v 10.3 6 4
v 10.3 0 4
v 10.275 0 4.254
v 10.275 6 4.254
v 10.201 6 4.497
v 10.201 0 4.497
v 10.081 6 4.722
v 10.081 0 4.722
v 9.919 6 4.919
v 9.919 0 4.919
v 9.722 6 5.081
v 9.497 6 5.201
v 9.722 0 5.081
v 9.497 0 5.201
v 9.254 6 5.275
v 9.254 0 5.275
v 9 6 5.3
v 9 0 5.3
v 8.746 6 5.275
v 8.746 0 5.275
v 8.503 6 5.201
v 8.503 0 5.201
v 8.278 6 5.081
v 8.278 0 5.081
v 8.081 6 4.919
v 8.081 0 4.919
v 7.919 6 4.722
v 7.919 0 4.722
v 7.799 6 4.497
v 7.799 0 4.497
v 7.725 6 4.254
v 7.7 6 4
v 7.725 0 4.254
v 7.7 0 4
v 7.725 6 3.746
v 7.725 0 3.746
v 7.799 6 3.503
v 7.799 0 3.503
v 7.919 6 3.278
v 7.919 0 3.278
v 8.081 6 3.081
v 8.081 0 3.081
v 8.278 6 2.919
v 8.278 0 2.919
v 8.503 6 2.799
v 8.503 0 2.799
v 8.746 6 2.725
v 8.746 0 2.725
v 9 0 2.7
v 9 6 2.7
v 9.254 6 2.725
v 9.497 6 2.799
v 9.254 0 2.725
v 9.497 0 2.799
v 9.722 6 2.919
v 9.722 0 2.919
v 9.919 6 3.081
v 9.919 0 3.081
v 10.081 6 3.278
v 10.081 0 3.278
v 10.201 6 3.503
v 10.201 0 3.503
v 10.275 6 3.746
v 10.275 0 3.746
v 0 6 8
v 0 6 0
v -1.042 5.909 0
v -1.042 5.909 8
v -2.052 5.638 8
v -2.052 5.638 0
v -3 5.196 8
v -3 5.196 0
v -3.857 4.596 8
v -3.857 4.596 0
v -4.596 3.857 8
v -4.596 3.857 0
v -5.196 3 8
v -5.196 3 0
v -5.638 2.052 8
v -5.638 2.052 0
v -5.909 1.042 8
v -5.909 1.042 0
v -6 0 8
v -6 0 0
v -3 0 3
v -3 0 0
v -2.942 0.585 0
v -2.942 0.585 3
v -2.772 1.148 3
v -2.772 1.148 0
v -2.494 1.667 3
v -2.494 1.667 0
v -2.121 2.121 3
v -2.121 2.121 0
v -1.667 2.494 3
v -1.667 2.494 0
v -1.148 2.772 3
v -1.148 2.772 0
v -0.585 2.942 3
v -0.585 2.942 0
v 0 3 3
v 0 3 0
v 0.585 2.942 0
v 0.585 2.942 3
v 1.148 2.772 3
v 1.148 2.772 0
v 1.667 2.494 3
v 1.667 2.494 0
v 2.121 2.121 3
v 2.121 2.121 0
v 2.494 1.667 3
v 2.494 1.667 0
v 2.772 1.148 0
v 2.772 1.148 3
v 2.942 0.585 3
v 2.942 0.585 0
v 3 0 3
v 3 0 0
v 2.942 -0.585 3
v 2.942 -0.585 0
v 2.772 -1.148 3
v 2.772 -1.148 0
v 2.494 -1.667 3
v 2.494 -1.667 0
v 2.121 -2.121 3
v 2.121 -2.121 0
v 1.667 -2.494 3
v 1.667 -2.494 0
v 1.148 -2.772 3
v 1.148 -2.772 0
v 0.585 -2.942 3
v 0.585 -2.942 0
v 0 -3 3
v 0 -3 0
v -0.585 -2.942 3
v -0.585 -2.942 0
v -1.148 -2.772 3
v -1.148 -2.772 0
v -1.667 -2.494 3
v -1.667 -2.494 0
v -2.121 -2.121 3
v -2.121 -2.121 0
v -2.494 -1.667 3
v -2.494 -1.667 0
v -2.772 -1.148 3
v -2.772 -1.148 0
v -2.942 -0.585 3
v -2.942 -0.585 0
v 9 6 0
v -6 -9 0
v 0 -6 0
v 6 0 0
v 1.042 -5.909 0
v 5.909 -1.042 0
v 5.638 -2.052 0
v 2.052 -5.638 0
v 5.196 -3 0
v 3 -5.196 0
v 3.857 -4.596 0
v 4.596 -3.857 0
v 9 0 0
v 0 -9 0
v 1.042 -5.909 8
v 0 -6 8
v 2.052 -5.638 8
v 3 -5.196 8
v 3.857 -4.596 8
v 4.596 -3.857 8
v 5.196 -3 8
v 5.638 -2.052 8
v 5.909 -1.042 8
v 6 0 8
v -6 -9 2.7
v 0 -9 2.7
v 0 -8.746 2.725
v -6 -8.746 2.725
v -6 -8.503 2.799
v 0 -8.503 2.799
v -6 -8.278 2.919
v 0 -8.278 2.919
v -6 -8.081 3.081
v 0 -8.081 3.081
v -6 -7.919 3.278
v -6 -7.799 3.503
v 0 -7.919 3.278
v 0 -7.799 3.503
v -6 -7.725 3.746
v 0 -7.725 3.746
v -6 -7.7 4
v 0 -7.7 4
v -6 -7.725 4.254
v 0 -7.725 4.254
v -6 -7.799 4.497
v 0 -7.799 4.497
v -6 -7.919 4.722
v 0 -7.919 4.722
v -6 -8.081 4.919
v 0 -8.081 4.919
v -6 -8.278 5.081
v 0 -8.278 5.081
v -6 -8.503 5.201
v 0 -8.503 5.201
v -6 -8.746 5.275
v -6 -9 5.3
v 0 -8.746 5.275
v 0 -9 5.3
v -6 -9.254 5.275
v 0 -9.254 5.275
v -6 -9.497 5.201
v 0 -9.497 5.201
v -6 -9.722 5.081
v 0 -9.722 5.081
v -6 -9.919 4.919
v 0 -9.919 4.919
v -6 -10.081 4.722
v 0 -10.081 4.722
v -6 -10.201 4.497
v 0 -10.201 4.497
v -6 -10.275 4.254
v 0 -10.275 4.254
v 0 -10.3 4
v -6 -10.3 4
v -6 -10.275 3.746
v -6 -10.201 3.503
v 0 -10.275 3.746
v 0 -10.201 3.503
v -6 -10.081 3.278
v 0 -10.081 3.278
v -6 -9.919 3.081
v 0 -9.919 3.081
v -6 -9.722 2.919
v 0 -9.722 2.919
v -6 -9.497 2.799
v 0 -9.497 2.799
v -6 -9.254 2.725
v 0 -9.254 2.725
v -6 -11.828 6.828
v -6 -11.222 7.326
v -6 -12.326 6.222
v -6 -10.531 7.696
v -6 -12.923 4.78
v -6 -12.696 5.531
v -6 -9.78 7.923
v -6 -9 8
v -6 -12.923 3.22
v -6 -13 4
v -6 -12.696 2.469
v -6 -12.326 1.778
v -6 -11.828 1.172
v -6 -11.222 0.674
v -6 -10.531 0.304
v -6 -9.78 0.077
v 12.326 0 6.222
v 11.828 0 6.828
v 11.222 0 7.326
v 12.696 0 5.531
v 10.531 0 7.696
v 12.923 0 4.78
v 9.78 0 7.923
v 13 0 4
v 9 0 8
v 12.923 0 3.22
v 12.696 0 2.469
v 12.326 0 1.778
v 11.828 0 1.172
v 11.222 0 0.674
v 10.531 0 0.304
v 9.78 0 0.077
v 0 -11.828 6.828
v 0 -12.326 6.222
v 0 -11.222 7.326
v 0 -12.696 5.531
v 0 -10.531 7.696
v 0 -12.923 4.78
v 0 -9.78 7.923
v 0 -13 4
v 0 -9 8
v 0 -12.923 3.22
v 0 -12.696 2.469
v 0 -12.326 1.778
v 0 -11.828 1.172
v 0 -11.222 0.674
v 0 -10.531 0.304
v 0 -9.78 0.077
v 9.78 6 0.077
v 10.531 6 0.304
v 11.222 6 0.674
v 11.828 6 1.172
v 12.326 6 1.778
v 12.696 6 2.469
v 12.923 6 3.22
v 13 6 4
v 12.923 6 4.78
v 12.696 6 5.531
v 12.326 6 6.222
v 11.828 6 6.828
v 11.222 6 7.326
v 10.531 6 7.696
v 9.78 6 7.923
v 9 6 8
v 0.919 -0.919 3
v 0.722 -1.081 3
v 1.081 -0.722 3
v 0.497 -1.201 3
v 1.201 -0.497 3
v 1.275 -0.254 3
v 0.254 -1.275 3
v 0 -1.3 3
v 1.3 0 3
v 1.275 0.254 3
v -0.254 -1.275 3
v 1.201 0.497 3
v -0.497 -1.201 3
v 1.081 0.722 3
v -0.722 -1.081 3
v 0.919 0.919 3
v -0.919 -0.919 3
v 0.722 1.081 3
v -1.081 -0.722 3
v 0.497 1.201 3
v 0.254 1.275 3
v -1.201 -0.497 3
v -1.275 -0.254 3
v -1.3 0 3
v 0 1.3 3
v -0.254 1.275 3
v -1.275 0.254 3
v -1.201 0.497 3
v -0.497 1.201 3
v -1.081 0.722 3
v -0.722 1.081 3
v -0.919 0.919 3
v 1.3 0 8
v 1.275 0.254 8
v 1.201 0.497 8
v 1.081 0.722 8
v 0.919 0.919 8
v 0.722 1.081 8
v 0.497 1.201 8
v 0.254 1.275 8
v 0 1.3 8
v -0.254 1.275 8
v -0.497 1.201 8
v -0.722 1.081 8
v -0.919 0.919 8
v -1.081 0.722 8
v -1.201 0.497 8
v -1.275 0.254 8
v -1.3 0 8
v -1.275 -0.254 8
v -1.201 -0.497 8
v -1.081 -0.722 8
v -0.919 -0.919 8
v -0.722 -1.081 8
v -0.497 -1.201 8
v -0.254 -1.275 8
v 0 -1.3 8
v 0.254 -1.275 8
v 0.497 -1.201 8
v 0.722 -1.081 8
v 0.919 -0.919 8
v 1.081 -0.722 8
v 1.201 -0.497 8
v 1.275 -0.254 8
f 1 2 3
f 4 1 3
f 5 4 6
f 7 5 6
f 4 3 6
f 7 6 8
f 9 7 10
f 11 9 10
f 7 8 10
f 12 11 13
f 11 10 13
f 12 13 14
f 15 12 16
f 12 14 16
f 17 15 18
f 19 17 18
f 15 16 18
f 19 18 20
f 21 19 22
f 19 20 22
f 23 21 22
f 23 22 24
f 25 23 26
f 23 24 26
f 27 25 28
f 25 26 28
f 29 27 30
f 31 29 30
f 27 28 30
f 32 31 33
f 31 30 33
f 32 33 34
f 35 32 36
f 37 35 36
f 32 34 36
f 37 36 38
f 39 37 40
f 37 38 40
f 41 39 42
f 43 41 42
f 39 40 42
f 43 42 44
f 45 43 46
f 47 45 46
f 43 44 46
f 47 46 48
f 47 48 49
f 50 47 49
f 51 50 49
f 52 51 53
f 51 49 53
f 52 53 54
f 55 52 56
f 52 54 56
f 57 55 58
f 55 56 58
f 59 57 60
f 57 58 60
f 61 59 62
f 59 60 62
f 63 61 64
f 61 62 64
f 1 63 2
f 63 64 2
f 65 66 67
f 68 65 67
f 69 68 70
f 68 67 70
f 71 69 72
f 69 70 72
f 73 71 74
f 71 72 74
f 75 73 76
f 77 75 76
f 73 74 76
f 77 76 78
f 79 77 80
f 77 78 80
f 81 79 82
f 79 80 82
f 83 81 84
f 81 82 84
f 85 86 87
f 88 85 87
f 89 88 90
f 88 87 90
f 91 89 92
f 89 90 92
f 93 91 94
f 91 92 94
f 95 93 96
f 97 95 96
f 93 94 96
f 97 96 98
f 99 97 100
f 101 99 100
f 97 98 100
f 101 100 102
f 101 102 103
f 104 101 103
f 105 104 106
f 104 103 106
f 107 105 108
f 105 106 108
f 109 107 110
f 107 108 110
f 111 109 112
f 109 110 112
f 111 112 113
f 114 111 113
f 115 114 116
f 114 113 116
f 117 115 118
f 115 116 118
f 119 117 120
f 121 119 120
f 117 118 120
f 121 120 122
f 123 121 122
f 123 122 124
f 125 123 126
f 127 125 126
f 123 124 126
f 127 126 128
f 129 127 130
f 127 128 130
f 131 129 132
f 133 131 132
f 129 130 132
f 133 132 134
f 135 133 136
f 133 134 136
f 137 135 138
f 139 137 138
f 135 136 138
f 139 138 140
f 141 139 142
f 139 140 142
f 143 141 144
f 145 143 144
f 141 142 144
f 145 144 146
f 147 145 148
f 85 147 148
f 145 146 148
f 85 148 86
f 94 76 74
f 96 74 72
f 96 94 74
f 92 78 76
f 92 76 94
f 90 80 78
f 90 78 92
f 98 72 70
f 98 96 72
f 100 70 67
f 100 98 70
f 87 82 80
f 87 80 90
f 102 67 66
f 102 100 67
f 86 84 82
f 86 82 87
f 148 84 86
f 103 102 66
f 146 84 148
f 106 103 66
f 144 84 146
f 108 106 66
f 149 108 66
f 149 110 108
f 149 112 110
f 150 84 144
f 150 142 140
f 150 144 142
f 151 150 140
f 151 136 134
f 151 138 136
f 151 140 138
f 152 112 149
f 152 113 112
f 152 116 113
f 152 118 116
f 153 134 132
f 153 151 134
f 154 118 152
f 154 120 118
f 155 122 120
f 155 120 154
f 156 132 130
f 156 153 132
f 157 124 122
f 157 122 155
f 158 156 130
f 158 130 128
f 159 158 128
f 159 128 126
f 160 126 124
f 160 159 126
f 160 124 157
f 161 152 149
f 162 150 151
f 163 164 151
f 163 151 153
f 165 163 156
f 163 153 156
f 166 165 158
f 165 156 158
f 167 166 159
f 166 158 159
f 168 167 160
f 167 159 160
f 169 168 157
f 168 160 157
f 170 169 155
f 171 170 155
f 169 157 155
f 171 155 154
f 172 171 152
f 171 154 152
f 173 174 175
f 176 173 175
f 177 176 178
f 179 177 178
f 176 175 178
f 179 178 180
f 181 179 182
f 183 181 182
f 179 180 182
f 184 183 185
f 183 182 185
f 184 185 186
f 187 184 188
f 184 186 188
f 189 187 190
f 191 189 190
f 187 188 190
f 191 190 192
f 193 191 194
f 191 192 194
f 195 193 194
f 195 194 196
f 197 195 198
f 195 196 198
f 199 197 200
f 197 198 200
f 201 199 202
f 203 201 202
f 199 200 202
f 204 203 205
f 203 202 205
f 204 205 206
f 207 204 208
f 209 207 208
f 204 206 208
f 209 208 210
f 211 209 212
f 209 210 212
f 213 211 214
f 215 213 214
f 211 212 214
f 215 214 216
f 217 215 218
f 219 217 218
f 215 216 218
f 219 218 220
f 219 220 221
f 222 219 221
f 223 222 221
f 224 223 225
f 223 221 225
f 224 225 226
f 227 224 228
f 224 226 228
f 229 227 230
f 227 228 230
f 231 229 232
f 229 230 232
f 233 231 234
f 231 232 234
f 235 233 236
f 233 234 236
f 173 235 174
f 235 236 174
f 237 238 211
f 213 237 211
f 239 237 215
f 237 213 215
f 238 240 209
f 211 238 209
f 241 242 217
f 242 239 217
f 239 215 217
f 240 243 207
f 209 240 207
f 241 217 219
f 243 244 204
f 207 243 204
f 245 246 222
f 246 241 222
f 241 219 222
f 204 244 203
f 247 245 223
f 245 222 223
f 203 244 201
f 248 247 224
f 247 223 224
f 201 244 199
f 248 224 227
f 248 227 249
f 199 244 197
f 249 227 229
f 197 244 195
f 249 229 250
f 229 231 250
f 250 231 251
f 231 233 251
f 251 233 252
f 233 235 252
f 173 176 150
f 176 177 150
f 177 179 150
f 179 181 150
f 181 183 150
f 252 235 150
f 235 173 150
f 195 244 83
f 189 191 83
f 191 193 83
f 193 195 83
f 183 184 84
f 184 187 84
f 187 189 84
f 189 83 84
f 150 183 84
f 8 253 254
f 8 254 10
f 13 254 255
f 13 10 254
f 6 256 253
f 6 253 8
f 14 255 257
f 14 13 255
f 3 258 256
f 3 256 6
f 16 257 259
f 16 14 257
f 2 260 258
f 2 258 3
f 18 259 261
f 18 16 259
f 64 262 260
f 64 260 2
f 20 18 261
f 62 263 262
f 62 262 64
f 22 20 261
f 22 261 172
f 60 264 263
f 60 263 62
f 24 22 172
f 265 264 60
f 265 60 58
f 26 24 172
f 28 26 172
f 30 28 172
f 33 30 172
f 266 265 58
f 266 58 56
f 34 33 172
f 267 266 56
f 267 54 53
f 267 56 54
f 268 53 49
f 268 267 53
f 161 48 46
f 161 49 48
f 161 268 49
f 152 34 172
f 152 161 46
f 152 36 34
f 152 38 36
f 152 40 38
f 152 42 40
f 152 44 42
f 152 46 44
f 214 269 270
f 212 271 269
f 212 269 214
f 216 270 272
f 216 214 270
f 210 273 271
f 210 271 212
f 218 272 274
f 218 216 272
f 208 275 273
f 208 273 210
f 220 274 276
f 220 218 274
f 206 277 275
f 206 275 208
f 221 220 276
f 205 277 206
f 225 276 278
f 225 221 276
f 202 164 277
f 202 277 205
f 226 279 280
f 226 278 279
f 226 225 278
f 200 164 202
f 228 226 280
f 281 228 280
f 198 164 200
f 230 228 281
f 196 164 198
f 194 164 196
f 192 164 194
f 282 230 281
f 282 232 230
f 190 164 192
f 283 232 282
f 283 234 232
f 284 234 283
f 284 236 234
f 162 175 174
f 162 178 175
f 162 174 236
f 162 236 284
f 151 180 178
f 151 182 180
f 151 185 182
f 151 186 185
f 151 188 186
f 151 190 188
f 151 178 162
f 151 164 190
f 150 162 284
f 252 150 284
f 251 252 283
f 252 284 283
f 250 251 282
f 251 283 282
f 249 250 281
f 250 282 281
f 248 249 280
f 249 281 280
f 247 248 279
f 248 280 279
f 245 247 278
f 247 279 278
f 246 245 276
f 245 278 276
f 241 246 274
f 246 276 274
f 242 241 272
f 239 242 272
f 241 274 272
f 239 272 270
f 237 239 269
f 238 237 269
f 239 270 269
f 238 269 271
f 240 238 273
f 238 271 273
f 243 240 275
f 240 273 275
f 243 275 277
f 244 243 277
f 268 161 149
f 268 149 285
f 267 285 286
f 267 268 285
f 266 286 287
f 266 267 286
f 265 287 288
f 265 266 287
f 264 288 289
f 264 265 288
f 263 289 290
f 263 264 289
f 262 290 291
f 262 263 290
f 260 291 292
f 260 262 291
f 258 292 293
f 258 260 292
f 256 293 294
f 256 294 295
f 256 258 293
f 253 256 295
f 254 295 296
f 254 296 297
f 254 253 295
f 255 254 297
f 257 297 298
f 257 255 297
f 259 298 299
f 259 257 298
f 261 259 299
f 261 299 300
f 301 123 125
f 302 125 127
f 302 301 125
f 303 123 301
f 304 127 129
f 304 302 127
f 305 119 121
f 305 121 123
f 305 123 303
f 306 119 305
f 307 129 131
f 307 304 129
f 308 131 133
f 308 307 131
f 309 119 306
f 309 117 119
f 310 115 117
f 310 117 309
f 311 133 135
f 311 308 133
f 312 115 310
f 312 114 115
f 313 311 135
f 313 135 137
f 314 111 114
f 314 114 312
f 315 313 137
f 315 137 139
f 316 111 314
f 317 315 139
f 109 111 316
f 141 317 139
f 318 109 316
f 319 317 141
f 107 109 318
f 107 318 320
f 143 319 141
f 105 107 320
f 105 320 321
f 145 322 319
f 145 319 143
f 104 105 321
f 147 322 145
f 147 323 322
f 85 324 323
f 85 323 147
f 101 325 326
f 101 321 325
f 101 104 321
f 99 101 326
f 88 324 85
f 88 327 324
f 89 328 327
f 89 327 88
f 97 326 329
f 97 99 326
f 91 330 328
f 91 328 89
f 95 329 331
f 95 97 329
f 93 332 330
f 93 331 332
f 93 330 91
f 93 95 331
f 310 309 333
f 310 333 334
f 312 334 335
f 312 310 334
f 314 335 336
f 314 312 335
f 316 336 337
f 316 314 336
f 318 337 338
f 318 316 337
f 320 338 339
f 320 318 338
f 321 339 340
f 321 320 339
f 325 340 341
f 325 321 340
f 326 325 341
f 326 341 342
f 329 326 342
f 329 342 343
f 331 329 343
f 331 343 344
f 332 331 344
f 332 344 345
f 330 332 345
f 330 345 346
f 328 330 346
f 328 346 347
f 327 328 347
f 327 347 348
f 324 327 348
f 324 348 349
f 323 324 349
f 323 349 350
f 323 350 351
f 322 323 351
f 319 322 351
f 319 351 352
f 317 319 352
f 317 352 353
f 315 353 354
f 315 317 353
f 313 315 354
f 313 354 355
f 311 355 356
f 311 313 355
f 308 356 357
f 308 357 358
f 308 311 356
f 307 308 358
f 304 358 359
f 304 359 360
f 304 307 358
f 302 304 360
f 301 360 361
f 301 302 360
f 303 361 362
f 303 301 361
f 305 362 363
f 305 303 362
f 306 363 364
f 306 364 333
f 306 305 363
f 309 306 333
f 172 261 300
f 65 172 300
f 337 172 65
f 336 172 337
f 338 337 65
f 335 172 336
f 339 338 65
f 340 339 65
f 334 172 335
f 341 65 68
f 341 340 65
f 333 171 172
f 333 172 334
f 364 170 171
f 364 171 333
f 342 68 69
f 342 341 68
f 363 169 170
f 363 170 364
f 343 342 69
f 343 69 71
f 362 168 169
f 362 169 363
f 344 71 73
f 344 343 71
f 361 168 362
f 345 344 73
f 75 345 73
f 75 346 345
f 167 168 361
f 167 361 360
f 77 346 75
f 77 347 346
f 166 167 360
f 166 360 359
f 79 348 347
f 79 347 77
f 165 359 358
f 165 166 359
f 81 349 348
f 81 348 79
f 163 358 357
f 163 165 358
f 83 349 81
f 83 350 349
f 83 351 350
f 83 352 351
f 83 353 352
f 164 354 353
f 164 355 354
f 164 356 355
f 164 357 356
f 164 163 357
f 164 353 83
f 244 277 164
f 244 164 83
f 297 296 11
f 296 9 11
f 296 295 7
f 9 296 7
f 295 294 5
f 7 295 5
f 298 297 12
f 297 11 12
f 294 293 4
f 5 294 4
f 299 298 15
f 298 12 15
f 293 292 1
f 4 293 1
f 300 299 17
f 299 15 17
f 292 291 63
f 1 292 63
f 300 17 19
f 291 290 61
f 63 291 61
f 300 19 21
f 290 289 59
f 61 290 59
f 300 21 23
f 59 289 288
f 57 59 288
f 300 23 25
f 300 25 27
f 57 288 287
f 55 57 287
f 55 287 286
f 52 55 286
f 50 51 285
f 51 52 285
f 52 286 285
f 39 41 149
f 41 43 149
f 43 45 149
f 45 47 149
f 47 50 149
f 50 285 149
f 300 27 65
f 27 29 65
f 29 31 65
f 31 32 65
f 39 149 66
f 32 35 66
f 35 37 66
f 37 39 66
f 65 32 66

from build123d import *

# Parameters (mm, degrees)
SKETCH1_R           = 6
SKETCH1_R_2         = 1.3
BOSS_EXTRUDE1_DEPTH = 8
SKETCH4_W           = 8
SKETCH4_H           = 3
BOSS_EXTRUDE2_DEPTH = 6
BOSS_EXTRUDE4_DEPTH = 6
SKETCH12_R          = 1.3
CUT_EXTRUDE6_DEPTH  = 6
SKETCH13_R          = 1.3
CUT_EXTRUDE7_DEPTH  = 6
SKETCH14_R          = 3
CUT_EXTRUDE8_DEPTH  = 3


with BuildPart() as part:
    # Sketch1 → Boss-Extrude1 (new body)
    with BuildSketch(Plane.XY):
        Circle(SKETCH1_R)
        Circle(SKETCH1_R_2, mode=Mode.SUBTRACT)
        with BuildLine():
            ThreePointArc((0, -6), (-4.242640687, -4.242640687), (-6, 0))
            Line((-6, 0), (-6, -6))
            Line((-6, -6), (0, -6))
        make_face()
        with BuildLine():
            Line((6, 6), (0, 6))
            ThreePointArc((0, 6), (4.242640687, 4.242640687), (6, 0))
            Line((6, 0), (6, 6))
        make_face()
    extrude(amount=BOSS_EXTRUDE1_DEPTH)

    # Sketch4 → Boss-Extrude2 (add)
    with BuildSketch(Plane(origin=(0, 0, 0), x_dir=(0, 0, -1), z_dir=(1, 0, 0))):
        with Locations((-4, -7.5)):
            Rectangle(SKETCH4_W, SKETCH4_H)
        with BuildLine():
            Line((-8, -9), (0, -9))
            ThreePointArc((0, -9), (-4, -13), (-8, -9))
        make_face()
    extrude(amount=-BOSS_EXTRUDE2_DEPTH)

    # Sketch5 → Boss-Extrude4 (add)
    with BuildSketch(Plane(origin=(0, 0, 0), x_dir=(1, 0, 0), z_dir=(0, 1, 0))):
        with BuildLine():
            Line((6, 0), (9, 0))
            ThreePointArc((9, 0), (13, -4), (9, -8))
            Line((9, -8), (6, -8))
            Line((6, -8), (6, 0))
        make_face()
    extrude(amount=BOSS_EXTRUDE4_DEPTH)

    # Sketch12 → Cut-Extrude6 (cut)
    with BuildSketch(Plane.XZ):
        with Locations((9, 4)):
            Circle(SKETCH12_R)
    extrude(amount=-CUT_EXTRUDE6_DEPTH, mode=Mode.SUBTRACT)

    # Sketch13 → Cut-Extrude7 (cut)
    with BuildSketch(Plane(origin=(0, 0, 0), x_dir=(0, 0, -1), z_dir=(1, 0, 0))):
        with Locations((-4, -9)):
            Circle(SKETCH13_R)
    extrude(amount=-CUT_EXTRUDE7_DEPTH, mode=Mode.SUBTRACT)

    # Sketch14 → Cut-Extrude8 (cut)
    with BuildSketch(Plane(origin=(0, 0, 0), x_dir=(-1, 0, 0), z_dir=(0, 0, -1))):
        Circle(SKETCH14_R)
    extrude(amount=-CUT_EXTRUDE8_DEPTH, mode=Mode.SUBTRACT)


solid = part.part
